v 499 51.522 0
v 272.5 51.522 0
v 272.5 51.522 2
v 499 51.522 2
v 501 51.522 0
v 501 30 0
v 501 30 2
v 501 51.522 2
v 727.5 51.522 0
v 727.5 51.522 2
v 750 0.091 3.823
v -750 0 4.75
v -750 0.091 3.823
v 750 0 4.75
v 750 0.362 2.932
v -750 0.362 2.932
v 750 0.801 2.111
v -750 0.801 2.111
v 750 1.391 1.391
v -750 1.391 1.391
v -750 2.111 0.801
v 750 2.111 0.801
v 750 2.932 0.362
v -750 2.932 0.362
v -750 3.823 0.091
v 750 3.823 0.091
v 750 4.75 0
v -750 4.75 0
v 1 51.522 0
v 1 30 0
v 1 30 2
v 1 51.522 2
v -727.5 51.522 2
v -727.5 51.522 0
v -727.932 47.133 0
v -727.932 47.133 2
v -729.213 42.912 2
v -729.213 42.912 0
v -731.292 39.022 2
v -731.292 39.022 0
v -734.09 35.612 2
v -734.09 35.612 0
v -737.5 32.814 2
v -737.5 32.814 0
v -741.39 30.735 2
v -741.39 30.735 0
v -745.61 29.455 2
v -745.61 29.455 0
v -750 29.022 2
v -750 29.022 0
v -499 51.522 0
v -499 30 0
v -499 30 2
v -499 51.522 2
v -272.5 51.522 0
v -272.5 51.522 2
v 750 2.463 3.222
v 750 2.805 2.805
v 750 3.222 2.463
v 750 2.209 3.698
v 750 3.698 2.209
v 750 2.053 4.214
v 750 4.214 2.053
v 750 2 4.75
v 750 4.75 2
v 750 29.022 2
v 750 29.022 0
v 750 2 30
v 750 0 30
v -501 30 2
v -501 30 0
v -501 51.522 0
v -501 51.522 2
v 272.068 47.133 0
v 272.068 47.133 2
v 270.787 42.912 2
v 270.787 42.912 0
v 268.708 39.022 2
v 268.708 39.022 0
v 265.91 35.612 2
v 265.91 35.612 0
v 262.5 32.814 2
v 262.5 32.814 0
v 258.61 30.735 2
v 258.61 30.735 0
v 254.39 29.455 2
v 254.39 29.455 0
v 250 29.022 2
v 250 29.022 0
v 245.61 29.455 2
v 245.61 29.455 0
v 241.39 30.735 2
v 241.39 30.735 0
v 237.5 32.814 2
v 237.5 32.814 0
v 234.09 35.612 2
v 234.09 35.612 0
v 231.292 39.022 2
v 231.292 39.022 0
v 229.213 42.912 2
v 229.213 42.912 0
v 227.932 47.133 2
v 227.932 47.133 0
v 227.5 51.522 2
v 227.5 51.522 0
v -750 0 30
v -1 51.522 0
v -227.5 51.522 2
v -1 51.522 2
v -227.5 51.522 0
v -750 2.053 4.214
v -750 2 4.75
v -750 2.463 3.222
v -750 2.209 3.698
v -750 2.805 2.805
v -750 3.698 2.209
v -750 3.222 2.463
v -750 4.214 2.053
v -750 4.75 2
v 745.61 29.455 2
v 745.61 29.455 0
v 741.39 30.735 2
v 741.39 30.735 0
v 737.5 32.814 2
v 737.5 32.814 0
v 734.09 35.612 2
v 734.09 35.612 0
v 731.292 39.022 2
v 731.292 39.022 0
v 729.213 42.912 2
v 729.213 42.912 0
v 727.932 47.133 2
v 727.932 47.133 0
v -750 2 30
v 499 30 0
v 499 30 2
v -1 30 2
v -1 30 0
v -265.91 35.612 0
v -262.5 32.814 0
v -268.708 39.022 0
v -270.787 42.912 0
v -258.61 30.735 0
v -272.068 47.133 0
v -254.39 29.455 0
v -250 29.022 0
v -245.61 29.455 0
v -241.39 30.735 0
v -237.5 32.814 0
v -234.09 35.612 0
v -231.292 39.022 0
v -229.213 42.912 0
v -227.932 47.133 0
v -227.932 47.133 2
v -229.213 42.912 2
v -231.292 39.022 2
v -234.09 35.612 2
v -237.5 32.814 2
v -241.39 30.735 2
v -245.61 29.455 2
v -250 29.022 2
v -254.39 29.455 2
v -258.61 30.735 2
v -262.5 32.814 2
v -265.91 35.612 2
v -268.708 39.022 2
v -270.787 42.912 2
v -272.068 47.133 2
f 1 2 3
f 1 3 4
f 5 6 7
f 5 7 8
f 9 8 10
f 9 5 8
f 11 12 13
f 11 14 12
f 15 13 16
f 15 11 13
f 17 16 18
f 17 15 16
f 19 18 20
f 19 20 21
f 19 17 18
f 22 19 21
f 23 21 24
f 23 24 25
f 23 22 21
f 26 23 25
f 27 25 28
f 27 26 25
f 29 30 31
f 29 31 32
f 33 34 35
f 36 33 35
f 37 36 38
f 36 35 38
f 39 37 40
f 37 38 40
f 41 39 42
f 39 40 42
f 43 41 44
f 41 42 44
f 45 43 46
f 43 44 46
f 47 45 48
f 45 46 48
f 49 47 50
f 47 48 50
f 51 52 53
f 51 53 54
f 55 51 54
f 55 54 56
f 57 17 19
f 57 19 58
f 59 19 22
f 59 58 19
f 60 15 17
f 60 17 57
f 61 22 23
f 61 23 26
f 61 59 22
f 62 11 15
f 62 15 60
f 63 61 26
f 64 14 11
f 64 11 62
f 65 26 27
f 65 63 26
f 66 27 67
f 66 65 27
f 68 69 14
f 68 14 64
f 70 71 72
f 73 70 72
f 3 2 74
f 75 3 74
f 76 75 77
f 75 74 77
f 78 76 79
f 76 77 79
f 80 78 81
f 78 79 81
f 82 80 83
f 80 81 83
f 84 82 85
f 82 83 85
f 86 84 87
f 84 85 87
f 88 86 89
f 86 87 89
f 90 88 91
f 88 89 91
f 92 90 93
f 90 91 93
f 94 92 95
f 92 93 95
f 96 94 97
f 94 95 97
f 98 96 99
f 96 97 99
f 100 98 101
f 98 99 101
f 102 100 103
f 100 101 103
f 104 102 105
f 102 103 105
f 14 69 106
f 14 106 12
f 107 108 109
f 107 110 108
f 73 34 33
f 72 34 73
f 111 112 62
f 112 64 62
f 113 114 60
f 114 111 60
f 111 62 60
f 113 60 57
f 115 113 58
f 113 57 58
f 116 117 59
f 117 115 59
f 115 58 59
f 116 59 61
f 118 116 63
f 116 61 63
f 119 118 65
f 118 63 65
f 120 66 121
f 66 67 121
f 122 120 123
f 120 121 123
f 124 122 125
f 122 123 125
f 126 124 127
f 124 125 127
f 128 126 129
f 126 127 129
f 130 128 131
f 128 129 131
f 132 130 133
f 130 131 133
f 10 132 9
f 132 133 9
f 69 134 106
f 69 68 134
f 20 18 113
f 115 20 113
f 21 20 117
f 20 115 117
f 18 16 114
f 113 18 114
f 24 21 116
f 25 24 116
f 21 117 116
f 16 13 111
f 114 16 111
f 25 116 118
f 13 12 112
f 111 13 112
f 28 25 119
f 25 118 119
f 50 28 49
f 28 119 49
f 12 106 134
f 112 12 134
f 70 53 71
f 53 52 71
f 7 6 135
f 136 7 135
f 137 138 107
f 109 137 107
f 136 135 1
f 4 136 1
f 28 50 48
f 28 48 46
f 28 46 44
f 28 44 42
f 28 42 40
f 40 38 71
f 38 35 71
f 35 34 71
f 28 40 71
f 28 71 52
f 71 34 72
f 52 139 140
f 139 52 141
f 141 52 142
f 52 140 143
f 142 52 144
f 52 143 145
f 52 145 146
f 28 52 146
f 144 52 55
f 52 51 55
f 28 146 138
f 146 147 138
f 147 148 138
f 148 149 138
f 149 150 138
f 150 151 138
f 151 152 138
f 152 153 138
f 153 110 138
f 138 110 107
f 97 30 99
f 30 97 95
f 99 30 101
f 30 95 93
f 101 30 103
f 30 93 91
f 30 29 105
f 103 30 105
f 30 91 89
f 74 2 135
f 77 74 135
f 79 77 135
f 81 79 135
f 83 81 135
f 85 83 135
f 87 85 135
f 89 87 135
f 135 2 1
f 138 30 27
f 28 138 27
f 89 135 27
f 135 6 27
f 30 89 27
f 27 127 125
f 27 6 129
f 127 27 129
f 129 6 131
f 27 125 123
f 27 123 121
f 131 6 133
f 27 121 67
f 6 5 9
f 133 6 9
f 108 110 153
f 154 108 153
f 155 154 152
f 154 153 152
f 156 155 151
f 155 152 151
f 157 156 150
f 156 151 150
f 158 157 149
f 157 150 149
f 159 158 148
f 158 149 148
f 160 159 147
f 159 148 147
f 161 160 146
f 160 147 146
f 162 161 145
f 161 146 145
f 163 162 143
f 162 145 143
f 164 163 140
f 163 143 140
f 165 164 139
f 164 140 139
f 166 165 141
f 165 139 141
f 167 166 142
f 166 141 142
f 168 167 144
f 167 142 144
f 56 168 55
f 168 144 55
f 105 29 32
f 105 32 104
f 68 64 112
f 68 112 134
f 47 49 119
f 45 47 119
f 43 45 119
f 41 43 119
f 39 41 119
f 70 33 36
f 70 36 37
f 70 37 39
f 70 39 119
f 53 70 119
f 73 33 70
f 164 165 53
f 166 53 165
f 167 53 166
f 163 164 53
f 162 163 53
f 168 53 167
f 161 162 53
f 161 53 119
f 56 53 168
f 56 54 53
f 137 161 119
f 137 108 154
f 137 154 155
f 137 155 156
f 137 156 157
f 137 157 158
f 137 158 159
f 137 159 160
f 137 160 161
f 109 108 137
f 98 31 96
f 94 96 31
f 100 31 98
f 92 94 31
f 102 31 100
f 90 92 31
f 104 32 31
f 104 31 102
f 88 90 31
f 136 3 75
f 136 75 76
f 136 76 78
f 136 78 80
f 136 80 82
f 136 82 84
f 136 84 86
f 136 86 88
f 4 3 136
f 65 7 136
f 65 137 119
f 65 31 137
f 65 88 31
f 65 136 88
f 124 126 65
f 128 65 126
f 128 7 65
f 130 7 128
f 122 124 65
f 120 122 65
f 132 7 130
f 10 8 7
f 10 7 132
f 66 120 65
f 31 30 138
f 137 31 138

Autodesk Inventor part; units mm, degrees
ref_plane "YZ Plane" through (0, 0, 0) normal (1, 0, 0) x (0, 1, 0)
ref_plane "XZ Plane" through (0, 0, 0) normal (0, 1, 0) x (-1, 0, 0)
ref_plane "XY Plane" through (0, 0, 0) normal (0, 0, 1) x (1, 0, 0)
sketch "Sketch1" plane through (0, 0, 0) normal (0, 0, 1) x (1, 0, 0)
  line L0 (-750, 51.5223) -> (750, 51.5223)
  line L1 (750, 51.5223) -> (750, 0)
  line L2 (750, 0) -> (-750, 0)
  line L3 (-750, 0) -> (-750, 51.5223)
  point P0 (0, 0)
  point P1 (0, 0)
  dimension "d0" = 1500
  dimension "d1" = 51.5224
extrude "Plate1" add sketch "Sketch1" along normal blind 2
sketch "Sketch2" plane through (750, 2, 0) normal (0, -1, 0) x (1, 0, 0)
  line L0 (-1500, 0) -> (0, 0)
  line L1 (0, 0) -> (0, 30)
  line L2 (0, 30) -> (-1500, 30)
  line L3 (-1500, 30) -> (-1500, 0)
edge flange "Flange1" height 30 angle 90 thickness 2 bend radius 2.75 thickness toward (0, -1, 0) relief round relief width 2 relief depth 1 edges at (0, 0, 2) wall of the first edge with corners at (-750, 2, 0) (750, 2, 0) (750, 2, 30) (-750, 2, 30)
bend "Bend1"
corner "Corner1"
sketch "Sketch5" plane through (0, 0, 0) normal (0, 0, -1) x (-1, 0, 0)
  line L0 (750, 51.5223) -> (-750, 51.5223) projected
  line L1 (-1, 30) -> (-1, 51.5223)
  line L2 (750, 0) -> (-750, 0) projected
  line L3 (-1, 30) -> (1, 30)
  line L4 (1, 30) -> (1, 51.5223)
  point P0 (0, 0)
  point P1 (0, 30)
  point P2 (0, 0)
  dimension "d27" = 2
  dimension "d28" = 30
extrude "Extrusion1" cut sketch "Sketch5" against normal through all
pattern_linear "Rectangular Pattern1" count 3 spacing 500 along (1, 0, 0) of "Extrusion1" first direction both ways yes
sketch "Sketch6" plane through (0, 0, 0) normal (0, 0, -1) x (-1, 0, 0)
  line L0 (-750, 51.5223) -> (-750, 4.75) projected
  circle A0 centre (-750, 51.5223) radius 22.5
  line L1 (-750, 51.5223) -> (750, 51.5223) projected
  line L2 (-1, 30) -> (-1, 51.5223) construction
  line L3 (-499, 51.5223) -> (-499, 30) construction
  line L4 (-499, 30) -> (-1, 30) construction
  circle A1 centre (-250, 51.5223) radius 22.5
  point P0 (0, 0)
  point P1 (-727.5, 51.5223)
  point P2 (-750, 29.0223)
  point P3 (-250, 30)
  point P4 (-227.5, 51.5223)
  point P5 (-272.5, 51.5223)
  dimension "d24" = 45
extrude "Extrusion2" cut sketch "Sketch6" against normal through all contours L1 A0 L0 | L1 A1 picked at (-748.3311, 36.7103) picked at (-248.2369, 40.5916)
mirror "Mirror1" about plane through (0, 0, 0) normal (1, 0, 0) of "Extrusion2"
sketch "Sketch7" plane through (0, 0, 2) normal (0, 0, 1) x (1, 0, 0)
  arc A0 (-750, 29.0223) -> (-727.5, 51.5223) centre (-750, 51.5223) ccw projected
  line L0 (-750, 4.75) -> (-750, 29.0223) projected
  line L1 (-750, 4.75) -> (750, 4.75) projected
  line L2 (750, 29.0223) -> (750, 4.75) projected
  arc A1 (727.5, 51.5223) -> (750, 29.0223) centre (750, 51.5223) ccw projected
  line L3 (501, 51.5223) -> (727.5, 51.5223) projected
  line L4 (501, 51.5223) -> (501, 30) projected
  line L5 (501, 30) -> (499, 30) projected
  line L6 (499, 30) -> (499, 51.5223) projected
  line L7 (1, 51.5223) -> (227.5, 51.5223) projected
  line L8 (1, 51.5223) -> (1, 30) projected
  line L9 (1, 30) -> (-1, 30) projected
  line L10 (-1, 30) -> (-1, 51.5223) projected
  line L11 (-499, 51.5223) -> (-272.5, 51.5223) projected
  line L12 (-499, 51.5223) -> (-499, 30) projected
  line L13 (-499, 30) -> (-501, 30) projected
  line L14 (-501, 30) -> (-501, 51.5223) projected
  line L15 (-727.5, 51.5223) -> (-501, 51.5223) projected
  line L16 (650, 4.75) -> (650, 51.5223) construction
  line L17 (-750, 4.75) -> (750, 4.75) projected
  line L18 (646, 24.6721) -> (650, 31.6003)
  line L19 (650, 31.6003) -> (654, 24.6721)
  line L20 (654, 24.6721) -> (646, 24.6721)
  line L21 (650, 31.6003) -> (650, 24.6721) construction
  line L22 (272.5, 51.5223) -> (499, 51.5223) projected
  arc A2 (227.5, 51.5223) -> (272.5, 51.5223) centre (250, 51.5223) ccw projected
  line L23 (-227.5, 51.5223) -> (-1, 51.5223) projected
  arc A3 (-272.5, 51.5223) -> (-227.5, 51.5223) centre (-250, 51.5223) ccw projected
  point P0 (0, 0)
  point P1 (650, 28.1362)
  dimension "d29" = 100
  dimension "d30" = 8
extrude "Extrusion3" [suppressed]
mirror "Mirror2" [suppressed]
sketch "Sketch8" plane through (0, 0, 2) normal (0, 0, 1) x (1, 0, 0)
  line L0 (494, 46.5223) -> (494, 34.5223) construction
  line L1 (494, 34.5223) -> (294, 34.5223) construction
  line L2 (294, 34.5223) -> (294, 46.5223) construction
  line L3 (294, 46.5223) -> (494, 46.5223) construction
  line L4 (501, 51.5223) -> (727.5, 51.5223) projected
  line L5 (272.5, 51.5223) -> (499, 51.5223) projected
  point P0 (0, 0)
  dimension "d35" = 200
  dimension "d36" = 12
  dimension "d39" = 5
  dimension "d40" = 5
mark "Mark1"
equation "\"d28\" = Стрингер_глубина_паза"
equation "\"d1\" = Стрингер_5"
equation "\"d27\" = d18"
equation "\"d2\" = Thickness"
equation "\"d3\" = BendReliefWidth"
equation "\"d4\" = BendReliefDepth"
equation "\"d5\" = MinimumRemnant"
equation "\"d6\" = TransitionRadius"
equation "\"d9\" = BendRadius"
equation "\"d10\" = CornerReliefSize"
equation "\"d11\" = GapSize"
equation "\"d12\" = JacobiRadiusSize"
equation "\"BendReliefWidth\" = Thickness"
equation "\"BendReliefDepth\" = 0.5 * Thickness"
equation "\"CornerReliefSize\" = 4 * Thickness"
equation "\"MinimumRemnant\" = 2 * Thickness"
equation "\"TransitionRadius\" = BendRadius"
equation "\"JacobiRadiusSize\" = BendRadius"
equation "\"GapSize\" = Thickness"
equation "\"d18\" = Thickness"
equation "\"Стрингер_5\" = 51.522347"
equation "\"Thickness\" = 2"
equation "\"BendRadius\" = 2.75"
equation "\"Стрингер_глубина_паза\" = 30"
properties part number "МОО 065 стрингер борт ###" material "Stainless Steel"
